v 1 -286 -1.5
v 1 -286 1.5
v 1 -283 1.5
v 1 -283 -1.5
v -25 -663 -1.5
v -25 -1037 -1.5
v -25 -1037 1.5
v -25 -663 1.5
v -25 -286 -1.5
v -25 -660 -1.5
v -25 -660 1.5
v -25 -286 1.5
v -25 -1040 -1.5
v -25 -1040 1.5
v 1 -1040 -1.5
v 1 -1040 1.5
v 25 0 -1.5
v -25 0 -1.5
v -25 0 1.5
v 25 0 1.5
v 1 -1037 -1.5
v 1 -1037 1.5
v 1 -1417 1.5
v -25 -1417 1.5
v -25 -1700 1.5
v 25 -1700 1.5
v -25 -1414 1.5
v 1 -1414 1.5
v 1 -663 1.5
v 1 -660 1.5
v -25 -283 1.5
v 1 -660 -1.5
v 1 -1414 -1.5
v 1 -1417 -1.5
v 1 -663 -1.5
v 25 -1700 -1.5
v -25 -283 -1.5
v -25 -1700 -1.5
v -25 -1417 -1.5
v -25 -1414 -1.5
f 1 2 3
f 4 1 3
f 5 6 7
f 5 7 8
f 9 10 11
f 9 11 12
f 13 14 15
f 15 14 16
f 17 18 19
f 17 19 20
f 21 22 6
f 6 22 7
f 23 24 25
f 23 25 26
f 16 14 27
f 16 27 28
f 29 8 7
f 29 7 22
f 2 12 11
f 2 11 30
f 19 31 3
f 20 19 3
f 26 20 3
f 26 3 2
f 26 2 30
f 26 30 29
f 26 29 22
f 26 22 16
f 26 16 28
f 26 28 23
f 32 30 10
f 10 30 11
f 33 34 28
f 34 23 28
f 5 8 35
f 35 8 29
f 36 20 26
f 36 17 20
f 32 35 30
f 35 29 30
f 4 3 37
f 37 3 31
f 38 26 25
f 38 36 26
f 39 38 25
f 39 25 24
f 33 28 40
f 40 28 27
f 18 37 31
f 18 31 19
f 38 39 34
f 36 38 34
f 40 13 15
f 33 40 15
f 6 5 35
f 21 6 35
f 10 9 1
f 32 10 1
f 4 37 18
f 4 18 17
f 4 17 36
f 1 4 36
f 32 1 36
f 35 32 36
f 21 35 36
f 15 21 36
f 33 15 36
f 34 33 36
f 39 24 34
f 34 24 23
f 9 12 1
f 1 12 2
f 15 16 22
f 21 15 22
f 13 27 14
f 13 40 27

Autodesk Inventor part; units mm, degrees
ref_plane "YZ Plane" through (0, 0, 0) normal (1, 0, 0) x (0, 1, 0)
ref_plane "XZ Plane" through (0, 0, 0) normal (0, 1, 0) x (-1, 0, 0)
ref_plane "XY Plane" through (0, 0, 0) normal (0, 0, 1) x (1, 0, 0)
sketch "Sketch1" plane through (0, 0, 0) normal (0, 0, 1) x (1, 0, 0)
  line L0 (-25, 0) -> (25, 0)
  line L1 (25, 0) -> (25, -1700)
  line L2 (25, -1700) -> (-25, -1700)
  line L3 (-25, -1700) -> (-25, 0)
  point P0 (0, 0)
  point P1 (0, 0)
  point P2 (-25, -1153.2713)
  dimension "d0" = 50
  dimension "d1" = 1700
extrude "Plate1" add sketch "Sketch1" along normal mid plane 3
sketch "Sketch2" plane through (0, 0, 1.5) normal (0, 0, 1) x (1, 0, 0)
  line L0 (-25, -1040) -> (1, -1040)
  line L1 (1, -1040) -> (1, -1037)
  line L2 (1, -1037) -> (-25, -1037)
  line L3 (-25, -1037) -> (-25, -1040)
  line L4 (-25, -1700) -> (-25, 0) projected
  line L5 (-25, -1417) -> (1, -1417)
  line L6 (1, -1417) -> (1, -1414)
  line L7 (1, -1414) -> (-25, -1414)
  line L8 (-25, -1414) -> (-25, -1417)
  line L9 (-25, -663) -> (1, -663)
  line L10 (1, -663) -> (1, -660)
  line L11 (1, -660) -> (-25, -660)
  line L12 (-25, -660) -> (-25, -663)
  line L13 (-25, -286) -> (1, -286)
  line L14 (1, -286) -> (1, -283)
  line L15 (1, -283) -> (-25, -283)
  line L16 (-25, -283) -> (-25, -286)
  point P0 (0, 0)
  point P1 (-25, -1038.5)
  point P2 (-25, -850)
  point P3 (-25, -1415.5)
  point P4 (-25, -661.5)
  point P5 (-25, -850)
  point P6 (-25, -284.5)
  dimension "d15" = 26
  dimension "d16" = 3
  dimension "d17" = 188.5
  dimension "d20" = 26
  dimension "d21" = 3
  dimension "d22" = 377
  dimension "d23" = 26
  dimension "d24" = 3
  dimension "d25" = 188.5
  dimension "d26" = 377
  dimension "d27" = 3
  dimension "d28" = 26
extrude "Extrusion1" cut sketch "Sketch2" against normal through all
equation "\"d20\" = d15"
equation "\"d21\" = d16"
equation "\"d23\" = d15"
equation "\"d24\" = d16"
equation "\"d27\" = d24"
equation "\"d28\" = d23"
equation "\"d2\" = Thickness"
equation "\"BendReliefWidth\" = Thickness"
equation "\"BendReliefDepth\" = 0.5 * Thickness"
equation "\"CornerReliefSize\" = 4 * Thickness"
equation "\"MinimumRemnant\" = 2 * Thickness"
equation "\"TransitionRadius\" = BendRadius"
equation "\"JacobiRadiusSize\" = BendRadius"
equation "\"GapSize\" = Thickness"
equation "\"Thickness\" = 3"
equation "\"BendRadius\" = 5"
properties part number "MSC 604 rib cone exit back" material "Stainless Steel"
